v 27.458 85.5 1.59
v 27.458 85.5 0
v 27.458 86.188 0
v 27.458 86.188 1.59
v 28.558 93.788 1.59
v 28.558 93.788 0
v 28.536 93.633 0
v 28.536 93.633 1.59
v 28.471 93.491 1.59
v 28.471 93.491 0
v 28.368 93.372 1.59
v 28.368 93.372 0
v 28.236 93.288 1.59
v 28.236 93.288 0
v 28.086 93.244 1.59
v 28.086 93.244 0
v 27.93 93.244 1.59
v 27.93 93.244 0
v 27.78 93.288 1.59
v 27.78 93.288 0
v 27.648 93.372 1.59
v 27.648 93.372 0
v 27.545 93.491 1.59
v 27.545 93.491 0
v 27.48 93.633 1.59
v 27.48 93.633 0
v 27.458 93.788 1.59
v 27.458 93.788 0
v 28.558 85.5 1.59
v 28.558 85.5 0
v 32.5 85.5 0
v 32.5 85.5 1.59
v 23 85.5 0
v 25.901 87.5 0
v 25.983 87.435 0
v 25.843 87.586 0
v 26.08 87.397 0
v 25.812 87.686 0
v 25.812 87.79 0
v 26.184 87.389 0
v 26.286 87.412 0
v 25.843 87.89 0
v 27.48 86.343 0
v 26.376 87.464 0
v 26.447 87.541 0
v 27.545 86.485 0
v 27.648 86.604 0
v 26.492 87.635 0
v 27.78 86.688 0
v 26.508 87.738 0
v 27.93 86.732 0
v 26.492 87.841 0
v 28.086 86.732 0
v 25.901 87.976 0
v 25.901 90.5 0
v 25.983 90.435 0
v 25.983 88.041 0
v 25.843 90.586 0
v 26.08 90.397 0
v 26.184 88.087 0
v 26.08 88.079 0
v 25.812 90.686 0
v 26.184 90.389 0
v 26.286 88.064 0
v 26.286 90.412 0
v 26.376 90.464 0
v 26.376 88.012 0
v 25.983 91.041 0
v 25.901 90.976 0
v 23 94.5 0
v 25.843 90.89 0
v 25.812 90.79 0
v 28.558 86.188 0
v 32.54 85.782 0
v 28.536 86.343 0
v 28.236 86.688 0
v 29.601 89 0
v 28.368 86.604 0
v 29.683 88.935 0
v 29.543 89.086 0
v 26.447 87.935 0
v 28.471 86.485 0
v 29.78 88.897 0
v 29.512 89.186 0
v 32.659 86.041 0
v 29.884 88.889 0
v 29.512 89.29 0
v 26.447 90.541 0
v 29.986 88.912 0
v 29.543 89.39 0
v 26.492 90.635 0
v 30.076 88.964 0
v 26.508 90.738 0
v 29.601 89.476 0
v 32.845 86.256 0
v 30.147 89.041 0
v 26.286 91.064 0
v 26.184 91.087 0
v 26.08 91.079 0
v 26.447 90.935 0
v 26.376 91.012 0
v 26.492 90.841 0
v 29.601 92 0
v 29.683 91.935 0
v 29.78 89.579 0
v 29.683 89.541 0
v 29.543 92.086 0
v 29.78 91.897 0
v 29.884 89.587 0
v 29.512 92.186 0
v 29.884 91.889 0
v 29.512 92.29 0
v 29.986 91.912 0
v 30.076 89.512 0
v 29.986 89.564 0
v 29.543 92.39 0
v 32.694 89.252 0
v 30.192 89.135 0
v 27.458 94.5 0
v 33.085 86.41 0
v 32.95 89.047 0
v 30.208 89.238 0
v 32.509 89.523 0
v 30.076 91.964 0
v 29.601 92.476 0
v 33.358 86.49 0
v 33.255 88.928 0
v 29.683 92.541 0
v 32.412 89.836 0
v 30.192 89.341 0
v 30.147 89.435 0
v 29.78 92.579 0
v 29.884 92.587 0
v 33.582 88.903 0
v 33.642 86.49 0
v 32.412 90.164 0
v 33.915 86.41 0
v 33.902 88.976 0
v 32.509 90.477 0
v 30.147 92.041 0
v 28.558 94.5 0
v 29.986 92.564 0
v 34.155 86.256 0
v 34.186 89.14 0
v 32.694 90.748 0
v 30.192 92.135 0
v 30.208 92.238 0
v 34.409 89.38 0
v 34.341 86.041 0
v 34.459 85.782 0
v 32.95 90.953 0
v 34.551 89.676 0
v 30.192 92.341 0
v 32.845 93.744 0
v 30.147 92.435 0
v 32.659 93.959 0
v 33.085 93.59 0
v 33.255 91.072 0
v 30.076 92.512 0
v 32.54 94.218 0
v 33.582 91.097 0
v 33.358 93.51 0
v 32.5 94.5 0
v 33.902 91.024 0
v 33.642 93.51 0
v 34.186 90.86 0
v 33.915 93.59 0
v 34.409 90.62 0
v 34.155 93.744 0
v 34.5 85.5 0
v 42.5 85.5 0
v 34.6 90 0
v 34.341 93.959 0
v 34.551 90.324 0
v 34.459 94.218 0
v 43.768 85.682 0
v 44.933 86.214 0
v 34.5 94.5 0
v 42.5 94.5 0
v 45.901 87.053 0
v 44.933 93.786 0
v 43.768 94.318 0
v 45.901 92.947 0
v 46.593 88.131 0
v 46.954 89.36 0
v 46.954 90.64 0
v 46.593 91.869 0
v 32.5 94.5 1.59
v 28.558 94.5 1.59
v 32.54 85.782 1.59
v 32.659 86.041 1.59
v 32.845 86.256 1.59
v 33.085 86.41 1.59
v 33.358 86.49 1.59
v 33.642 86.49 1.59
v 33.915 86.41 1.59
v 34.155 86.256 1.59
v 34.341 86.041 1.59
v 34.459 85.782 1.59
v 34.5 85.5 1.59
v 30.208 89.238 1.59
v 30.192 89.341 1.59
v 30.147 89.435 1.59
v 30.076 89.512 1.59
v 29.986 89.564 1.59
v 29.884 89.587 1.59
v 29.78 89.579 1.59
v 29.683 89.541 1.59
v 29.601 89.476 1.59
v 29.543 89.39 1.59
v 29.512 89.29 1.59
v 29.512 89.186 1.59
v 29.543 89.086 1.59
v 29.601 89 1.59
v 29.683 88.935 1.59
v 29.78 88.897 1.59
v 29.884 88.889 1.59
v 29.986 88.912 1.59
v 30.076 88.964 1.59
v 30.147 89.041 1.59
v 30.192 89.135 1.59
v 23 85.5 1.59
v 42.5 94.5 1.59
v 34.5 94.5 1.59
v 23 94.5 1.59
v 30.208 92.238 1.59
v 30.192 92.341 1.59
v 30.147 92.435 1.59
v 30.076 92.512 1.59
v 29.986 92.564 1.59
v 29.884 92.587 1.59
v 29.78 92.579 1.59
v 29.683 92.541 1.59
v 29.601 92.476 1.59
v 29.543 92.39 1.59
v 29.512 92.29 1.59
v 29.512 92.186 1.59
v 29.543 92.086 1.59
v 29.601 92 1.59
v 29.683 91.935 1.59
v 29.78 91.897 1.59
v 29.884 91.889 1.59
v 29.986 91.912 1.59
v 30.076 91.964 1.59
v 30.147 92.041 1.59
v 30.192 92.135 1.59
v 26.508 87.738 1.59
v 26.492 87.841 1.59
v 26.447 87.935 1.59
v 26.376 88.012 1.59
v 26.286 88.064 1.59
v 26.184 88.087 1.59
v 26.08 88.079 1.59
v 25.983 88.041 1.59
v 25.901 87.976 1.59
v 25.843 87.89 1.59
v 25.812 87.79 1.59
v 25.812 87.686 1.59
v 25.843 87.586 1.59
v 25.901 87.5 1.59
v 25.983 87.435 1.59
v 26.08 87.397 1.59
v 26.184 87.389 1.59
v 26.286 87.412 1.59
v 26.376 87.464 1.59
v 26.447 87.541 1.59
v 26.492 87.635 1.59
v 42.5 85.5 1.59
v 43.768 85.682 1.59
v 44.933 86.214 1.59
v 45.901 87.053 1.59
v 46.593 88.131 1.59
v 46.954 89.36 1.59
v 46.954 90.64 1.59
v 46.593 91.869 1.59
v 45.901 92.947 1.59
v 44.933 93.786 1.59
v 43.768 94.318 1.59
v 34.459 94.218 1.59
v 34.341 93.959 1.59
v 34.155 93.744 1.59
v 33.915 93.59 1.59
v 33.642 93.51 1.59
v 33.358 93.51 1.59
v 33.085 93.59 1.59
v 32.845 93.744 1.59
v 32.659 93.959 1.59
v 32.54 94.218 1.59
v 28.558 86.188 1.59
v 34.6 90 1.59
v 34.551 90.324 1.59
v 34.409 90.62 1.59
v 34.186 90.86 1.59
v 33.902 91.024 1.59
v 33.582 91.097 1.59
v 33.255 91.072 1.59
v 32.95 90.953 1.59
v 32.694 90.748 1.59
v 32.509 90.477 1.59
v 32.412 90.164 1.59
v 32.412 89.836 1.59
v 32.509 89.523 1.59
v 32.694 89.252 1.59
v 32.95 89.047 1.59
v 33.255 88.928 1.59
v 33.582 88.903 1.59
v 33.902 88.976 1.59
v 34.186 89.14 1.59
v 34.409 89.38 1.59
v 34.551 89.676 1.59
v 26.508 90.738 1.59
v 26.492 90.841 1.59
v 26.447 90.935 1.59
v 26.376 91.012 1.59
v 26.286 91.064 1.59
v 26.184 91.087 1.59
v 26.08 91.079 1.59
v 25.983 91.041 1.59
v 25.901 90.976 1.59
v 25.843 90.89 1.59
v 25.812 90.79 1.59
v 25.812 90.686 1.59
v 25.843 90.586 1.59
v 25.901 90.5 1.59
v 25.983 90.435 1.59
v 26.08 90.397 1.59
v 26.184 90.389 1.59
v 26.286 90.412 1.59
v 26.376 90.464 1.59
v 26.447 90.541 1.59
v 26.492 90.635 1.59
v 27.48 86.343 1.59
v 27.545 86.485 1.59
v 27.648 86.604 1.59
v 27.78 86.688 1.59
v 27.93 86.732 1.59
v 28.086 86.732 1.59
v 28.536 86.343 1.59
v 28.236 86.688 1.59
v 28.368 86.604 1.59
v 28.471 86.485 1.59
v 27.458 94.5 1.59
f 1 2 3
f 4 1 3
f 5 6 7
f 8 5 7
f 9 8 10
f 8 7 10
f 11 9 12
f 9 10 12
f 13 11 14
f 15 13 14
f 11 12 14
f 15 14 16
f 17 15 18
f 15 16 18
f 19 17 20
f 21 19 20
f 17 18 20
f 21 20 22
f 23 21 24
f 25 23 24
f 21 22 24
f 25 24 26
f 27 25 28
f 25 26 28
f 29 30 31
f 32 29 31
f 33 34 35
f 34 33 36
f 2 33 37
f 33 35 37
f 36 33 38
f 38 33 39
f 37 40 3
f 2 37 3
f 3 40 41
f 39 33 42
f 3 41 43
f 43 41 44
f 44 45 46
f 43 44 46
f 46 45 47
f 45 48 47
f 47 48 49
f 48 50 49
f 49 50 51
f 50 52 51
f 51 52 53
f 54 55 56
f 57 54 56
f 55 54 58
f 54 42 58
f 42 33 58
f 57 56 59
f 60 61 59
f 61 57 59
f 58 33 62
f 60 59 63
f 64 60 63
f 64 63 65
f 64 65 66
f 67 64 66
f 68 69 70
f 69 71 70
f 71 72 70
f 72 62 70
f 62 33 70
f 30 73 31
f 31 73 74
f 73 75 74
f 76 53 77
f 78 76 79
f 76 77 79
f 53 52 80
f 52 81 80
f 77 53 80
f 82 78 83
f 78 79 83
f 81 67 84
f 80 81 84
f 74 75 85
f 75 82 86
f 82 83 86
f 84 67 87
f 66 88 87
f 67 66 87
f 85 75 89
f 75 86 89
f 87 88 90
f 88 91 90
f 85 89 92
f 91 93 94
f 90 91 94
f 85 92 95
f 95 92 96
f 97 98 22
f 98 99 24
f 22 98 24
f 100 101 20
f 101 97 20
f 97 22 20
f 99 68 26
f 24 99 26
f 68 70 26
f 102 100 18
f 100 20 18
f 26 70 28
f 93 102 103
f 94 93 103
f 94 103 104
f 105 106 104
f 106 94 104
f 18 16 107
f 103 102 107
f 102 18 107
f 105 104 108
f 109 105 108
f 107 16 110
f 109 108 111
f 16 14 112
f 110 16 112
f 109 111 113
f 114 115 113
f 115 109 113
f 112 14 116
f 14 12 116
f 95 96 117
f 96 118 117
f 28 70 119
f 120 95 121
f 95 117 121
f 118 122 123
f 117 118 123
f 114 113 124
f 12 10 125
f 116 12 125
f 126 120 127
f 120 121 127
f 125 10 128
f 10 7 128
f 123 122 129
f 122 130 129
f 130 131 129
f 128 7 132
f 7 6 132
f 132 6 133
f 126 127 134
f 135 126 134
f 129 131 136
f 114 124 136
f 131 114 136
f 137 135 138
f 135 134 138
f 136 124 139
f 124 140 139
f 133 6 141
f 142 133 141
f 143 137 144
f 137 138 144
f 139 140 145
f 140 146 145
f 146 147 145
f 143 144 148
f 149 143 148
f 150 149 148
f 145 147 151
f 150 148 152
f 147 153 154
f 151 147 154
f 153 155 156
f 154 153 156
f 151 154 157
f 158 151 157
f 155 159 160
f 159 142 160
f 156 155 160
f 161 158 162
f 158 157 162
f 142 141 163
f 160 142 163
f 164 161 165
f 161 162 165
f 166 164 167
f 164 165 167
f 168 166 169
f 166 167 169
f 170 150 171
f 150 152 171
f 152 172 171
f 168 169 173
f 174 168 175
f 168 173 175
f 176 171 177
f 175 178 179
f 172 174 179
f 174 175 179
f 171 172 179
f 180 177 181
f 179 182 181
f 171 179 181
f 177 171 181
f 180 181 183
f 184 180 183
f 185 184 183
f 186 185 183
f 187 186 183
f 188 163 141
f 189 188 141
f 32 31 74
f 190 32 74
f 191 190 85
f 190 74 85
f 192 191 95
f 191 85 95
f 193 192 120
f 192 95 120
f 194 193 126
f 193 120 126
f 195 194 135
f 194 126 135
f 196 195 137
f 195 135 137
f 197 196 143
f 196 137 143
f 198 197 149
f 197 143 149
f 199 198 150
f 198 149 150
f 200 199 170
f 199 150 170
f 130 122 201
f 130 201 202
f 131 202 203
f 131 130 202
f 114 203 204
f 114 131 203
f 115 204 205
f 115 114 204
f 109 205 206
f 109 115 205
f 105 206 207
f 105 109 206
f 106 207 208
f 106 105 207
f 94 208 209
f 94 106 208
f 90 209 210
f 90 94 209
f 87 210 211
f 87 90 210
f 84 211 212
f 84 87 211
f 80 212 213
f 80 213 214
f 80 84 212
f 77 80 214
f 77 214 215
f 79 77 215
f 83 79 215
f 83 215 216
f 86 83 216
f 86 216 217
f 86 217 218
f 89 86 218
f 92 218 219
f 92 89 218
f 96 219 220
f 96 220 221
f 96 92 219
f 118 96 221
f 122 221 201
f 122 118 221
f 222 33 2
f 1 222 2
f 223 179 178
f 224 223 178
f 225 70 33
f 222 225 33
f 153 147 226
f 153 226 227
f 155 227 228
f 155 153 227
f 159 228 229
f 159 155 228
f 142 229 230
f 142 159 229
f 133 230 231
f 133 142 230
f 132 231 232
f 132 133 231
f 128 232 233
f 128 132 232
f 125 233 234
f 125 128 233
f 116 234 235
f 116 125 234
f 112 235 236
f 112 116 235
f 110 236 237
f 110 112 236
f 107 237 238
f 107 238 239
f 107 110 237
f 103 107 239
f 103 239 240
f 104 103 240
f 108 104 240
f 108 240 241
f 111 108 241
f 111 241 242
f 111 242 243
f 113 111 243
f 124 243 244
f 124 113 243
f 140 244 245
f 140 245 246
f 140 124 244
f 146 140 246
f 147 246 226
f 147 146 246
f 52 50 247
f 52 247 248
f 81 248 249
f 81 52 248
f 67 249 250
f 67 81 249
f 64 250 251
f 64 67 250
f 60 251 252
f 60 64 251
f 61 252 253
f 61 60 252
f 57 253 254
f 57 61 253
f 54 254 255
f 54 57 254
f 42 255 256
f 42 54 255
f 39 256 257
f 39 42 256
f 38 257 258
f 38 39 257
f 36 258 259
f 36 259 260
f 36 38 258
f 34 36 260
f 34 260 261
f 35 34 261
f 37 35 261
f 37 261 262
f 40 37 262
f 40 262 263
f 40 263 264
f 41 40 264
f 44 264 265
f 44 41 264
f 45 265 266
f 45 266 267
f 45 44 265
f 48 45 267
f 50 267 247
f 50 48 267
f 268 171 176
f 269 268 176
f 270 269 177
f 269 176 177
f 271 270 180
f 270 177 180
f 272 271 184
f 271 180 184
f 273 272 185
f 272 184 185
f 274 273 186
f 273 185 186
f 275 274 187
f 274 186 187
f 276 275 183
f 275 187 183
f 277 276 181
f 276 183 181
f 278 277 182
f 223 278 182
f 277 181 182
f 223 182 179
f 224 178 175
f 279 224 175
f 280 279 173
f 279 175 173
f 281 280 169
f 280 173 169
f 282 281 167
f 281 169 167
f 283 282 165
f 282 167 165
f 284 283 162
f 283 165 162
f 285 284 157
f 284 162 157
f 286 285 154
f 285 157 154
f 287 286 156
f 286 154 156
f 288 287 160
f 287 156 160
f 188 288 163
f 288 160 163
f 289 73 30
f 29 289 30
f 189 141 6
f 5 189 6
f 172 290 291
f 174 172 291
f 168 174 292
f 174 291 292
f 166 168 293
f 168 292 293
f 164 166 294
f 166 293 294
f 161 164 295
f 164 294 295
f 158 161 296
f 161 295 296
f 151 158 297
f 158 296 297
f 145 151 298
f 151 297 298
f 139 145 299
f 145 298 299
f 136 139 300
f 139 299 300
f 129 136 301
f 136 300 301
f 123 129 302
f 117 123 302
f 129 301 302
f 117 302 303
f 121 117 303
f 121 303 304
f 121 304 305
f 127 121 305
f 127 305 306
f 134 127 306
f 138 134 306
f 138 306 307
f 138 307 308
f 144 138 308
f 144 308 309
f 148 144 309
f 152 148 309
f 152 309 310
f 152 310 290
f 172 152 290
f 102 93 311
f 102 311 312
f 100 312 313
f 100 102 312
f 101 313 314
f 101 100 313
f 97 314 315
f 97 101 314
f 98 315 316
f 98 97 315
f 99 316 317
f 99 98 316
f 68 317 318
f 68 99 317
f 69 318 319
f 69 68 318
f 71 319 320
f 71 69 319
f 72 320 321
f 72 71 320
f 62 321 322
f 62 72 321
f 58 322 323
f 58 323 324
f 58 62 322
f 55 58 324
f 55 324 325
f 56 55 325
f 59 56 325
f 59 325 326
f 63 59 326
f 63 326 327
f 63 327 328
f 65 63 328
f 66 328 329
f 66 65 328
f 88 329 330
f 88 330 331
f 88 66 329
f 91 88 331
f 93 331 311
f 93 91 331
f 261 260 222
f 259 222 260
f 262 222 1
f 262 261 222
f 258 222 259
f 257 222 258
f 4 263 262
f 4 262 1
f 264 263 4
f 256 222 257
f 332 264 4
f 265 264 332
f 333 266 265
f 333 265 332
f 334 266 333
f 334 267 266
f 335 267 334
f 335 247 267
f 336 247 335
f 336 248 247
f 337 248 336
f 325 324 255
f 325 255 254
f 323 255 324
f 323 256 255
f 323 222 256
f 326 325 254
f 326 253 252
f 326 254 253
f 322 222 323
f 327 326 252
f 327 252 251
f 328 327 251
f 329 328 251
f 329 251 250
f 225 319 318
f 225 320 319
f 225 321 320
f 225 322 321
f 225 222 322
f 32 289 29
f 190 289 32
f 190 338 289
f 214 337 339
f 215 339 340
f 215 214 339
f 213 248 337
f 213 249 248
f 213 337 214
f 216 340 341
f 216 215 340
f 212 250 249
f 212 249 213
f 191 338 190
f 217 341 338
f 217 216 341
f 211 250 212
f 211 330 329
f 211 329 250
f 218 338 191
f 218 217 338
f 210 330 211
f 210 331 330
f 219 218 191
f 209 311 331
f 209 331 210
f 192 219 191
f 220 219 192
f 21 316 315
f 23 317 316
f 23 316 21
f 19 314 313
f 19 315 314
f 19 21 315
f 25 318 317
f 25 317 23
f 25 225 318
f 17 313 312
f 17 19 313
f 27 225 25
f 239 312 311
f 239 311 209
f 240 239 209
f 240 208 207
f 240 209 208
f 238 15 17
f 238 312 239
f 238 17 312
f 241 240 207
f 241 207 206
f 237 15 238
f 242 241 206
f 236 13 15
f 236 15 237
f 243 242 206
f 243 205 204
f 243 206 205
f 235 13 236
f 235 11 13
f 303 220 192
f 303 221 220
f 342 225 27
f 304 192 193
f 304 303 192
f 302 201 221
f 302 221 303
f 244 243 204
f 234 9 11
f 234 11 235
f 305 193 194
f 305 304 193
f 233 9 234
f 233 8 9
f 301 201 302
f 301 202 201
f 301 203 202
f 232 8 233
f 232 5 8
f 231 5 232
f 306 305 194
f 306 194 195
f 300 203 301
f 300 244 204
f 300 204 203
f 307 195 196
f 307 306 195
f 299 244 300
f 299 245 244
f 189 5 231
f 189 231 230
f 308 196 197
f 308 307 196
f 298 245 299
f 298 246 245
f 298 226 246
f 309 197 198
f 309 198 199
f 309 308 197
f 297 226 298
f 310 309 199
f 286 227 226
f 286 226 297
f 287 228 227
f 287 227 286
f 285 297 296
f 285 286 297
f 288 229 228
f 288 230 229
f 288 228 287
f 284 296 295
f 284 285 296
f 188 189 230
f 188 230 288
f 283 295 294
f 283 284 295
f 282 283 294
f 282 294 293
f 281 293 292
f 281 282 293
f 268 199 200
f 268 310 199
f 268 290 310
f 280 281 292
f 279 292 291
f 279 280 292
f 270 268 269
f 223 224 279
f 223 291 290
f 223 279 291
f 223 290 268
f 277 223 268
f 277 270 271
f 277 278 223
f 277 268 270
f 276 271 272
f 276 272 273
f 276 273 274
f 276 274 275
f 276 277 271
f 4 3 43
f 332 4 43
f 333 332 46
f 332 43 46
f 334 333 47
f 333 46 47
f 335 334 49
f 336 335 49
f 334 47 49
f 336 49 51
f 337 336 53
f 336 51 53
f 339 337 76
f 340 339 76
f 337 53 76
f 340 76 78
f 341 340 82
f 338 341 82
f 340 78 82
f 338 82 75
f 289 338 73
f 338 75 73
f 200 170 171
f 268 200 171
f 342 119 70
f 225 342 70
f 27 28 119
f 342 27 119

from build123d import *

# Parameters (mm, degrees)
BOARD_DEPTH                        = 1.59
F_1_0_228_DIAMETER_HOLE1_OUTLINE_R = 0.35
F_1_0_228_DIAMETER_HOLE1_DEPTH     = 1.59
SKETCH4_R                          = 1.1
CUT_EXTRUDE1_DEPTH                 = 106.554608126


# Read off the part's stored shape, not the designer's step: #1 (0.228) Diameter Hole1
with BuildPart() as part:
    # Sketch1 → Board (new body)
    with BuildSketch(Plane.XY):
        with BuildLine():
            Line((27.45799, 93.788), (27.45799, 94.5))
            Line((27.45799, 94.5), (22.99997, 94.5))
            Line((22.99997, 94.5), (22.99997, 85.5))
            Line((22.99997, 85.5), (27.45799, 85.49998))
            Line((27.45799, 85.49998), (27.45799, 86.18801))
            ThreePointArc((27.45799, 86.18801), (28.00799, 86.73801), (28.55799, 86.18801))
            Line((28.55799, 86.18801), (28.55799, 85.49998))
            Line((28.55799, 85.49998), (32.49999, 85.49998))
            ThreePointArc((32.49999, 85.49998), (33.49997, 86.49998), (34.49997, 85.5))
            Line((34.49997, 85.5), (42.49997, 85.5))
            ThreePointArc((42.49997, 85.5), (46.999970177, 90), (42.49997, 94.5))
            Line((42.49997, 94.5), (34.49997, 94.5))
            ThreePointArc((34.49997, 94.5), (33.49997, 93.5), (32.49997, 94.5))
            Line((32.49997, 94.5), (28.55799, 94.5))
            Line((28.55799, 94.5), (28.55799, 93.788))
            ThreePointArc((28.55799, 93.788), (28.00799, 93.238), (27.45799, 93.788))
        make_face()
    extrude(amount=BOARD_DEPTH)

    # #1 (0.228) Diameter Hole1 outline → #1 (0.228) Diameter Hole1 (cut)
    with BuildSketch(Plane.XY):
        with Locations((29.85799, 92.238)):
            Circle(F_1_0_228_DIAMETER_HOLE1_OUTLINE_R)
        with Locations((26.15799, 90.738)):
            Circle(F_1_0_228_DIAMETER_HOLE1_OUTLINE_R)
        with Locations((29.85799, 89.238)):
            Circle(F_1_0_228_DIAMETER_HOLE1_OUTLINE_R)
        with Locations((26.15799, 87.738)):
            Circle(F_1_0_228_DIAMETER_HOLE1_OUTLINE_R)
    extrude(amount=F_1_0_228_DIAMETER_HOLE1_DEPTH, mode=Mode.SUBTRACT)

    # Sketch4 → Cut-Extrude1 (cut, through all)
    with BuildSketch(Plane.XY.offset(1.59)):
        with Locations((33.49997, 90)):
            Circle(SKETCH4_R)
    extrude(amount=-CUT_EXTRUDE1_DEPTH, mode=Mode.SUBTRACT)


solid = part.part
